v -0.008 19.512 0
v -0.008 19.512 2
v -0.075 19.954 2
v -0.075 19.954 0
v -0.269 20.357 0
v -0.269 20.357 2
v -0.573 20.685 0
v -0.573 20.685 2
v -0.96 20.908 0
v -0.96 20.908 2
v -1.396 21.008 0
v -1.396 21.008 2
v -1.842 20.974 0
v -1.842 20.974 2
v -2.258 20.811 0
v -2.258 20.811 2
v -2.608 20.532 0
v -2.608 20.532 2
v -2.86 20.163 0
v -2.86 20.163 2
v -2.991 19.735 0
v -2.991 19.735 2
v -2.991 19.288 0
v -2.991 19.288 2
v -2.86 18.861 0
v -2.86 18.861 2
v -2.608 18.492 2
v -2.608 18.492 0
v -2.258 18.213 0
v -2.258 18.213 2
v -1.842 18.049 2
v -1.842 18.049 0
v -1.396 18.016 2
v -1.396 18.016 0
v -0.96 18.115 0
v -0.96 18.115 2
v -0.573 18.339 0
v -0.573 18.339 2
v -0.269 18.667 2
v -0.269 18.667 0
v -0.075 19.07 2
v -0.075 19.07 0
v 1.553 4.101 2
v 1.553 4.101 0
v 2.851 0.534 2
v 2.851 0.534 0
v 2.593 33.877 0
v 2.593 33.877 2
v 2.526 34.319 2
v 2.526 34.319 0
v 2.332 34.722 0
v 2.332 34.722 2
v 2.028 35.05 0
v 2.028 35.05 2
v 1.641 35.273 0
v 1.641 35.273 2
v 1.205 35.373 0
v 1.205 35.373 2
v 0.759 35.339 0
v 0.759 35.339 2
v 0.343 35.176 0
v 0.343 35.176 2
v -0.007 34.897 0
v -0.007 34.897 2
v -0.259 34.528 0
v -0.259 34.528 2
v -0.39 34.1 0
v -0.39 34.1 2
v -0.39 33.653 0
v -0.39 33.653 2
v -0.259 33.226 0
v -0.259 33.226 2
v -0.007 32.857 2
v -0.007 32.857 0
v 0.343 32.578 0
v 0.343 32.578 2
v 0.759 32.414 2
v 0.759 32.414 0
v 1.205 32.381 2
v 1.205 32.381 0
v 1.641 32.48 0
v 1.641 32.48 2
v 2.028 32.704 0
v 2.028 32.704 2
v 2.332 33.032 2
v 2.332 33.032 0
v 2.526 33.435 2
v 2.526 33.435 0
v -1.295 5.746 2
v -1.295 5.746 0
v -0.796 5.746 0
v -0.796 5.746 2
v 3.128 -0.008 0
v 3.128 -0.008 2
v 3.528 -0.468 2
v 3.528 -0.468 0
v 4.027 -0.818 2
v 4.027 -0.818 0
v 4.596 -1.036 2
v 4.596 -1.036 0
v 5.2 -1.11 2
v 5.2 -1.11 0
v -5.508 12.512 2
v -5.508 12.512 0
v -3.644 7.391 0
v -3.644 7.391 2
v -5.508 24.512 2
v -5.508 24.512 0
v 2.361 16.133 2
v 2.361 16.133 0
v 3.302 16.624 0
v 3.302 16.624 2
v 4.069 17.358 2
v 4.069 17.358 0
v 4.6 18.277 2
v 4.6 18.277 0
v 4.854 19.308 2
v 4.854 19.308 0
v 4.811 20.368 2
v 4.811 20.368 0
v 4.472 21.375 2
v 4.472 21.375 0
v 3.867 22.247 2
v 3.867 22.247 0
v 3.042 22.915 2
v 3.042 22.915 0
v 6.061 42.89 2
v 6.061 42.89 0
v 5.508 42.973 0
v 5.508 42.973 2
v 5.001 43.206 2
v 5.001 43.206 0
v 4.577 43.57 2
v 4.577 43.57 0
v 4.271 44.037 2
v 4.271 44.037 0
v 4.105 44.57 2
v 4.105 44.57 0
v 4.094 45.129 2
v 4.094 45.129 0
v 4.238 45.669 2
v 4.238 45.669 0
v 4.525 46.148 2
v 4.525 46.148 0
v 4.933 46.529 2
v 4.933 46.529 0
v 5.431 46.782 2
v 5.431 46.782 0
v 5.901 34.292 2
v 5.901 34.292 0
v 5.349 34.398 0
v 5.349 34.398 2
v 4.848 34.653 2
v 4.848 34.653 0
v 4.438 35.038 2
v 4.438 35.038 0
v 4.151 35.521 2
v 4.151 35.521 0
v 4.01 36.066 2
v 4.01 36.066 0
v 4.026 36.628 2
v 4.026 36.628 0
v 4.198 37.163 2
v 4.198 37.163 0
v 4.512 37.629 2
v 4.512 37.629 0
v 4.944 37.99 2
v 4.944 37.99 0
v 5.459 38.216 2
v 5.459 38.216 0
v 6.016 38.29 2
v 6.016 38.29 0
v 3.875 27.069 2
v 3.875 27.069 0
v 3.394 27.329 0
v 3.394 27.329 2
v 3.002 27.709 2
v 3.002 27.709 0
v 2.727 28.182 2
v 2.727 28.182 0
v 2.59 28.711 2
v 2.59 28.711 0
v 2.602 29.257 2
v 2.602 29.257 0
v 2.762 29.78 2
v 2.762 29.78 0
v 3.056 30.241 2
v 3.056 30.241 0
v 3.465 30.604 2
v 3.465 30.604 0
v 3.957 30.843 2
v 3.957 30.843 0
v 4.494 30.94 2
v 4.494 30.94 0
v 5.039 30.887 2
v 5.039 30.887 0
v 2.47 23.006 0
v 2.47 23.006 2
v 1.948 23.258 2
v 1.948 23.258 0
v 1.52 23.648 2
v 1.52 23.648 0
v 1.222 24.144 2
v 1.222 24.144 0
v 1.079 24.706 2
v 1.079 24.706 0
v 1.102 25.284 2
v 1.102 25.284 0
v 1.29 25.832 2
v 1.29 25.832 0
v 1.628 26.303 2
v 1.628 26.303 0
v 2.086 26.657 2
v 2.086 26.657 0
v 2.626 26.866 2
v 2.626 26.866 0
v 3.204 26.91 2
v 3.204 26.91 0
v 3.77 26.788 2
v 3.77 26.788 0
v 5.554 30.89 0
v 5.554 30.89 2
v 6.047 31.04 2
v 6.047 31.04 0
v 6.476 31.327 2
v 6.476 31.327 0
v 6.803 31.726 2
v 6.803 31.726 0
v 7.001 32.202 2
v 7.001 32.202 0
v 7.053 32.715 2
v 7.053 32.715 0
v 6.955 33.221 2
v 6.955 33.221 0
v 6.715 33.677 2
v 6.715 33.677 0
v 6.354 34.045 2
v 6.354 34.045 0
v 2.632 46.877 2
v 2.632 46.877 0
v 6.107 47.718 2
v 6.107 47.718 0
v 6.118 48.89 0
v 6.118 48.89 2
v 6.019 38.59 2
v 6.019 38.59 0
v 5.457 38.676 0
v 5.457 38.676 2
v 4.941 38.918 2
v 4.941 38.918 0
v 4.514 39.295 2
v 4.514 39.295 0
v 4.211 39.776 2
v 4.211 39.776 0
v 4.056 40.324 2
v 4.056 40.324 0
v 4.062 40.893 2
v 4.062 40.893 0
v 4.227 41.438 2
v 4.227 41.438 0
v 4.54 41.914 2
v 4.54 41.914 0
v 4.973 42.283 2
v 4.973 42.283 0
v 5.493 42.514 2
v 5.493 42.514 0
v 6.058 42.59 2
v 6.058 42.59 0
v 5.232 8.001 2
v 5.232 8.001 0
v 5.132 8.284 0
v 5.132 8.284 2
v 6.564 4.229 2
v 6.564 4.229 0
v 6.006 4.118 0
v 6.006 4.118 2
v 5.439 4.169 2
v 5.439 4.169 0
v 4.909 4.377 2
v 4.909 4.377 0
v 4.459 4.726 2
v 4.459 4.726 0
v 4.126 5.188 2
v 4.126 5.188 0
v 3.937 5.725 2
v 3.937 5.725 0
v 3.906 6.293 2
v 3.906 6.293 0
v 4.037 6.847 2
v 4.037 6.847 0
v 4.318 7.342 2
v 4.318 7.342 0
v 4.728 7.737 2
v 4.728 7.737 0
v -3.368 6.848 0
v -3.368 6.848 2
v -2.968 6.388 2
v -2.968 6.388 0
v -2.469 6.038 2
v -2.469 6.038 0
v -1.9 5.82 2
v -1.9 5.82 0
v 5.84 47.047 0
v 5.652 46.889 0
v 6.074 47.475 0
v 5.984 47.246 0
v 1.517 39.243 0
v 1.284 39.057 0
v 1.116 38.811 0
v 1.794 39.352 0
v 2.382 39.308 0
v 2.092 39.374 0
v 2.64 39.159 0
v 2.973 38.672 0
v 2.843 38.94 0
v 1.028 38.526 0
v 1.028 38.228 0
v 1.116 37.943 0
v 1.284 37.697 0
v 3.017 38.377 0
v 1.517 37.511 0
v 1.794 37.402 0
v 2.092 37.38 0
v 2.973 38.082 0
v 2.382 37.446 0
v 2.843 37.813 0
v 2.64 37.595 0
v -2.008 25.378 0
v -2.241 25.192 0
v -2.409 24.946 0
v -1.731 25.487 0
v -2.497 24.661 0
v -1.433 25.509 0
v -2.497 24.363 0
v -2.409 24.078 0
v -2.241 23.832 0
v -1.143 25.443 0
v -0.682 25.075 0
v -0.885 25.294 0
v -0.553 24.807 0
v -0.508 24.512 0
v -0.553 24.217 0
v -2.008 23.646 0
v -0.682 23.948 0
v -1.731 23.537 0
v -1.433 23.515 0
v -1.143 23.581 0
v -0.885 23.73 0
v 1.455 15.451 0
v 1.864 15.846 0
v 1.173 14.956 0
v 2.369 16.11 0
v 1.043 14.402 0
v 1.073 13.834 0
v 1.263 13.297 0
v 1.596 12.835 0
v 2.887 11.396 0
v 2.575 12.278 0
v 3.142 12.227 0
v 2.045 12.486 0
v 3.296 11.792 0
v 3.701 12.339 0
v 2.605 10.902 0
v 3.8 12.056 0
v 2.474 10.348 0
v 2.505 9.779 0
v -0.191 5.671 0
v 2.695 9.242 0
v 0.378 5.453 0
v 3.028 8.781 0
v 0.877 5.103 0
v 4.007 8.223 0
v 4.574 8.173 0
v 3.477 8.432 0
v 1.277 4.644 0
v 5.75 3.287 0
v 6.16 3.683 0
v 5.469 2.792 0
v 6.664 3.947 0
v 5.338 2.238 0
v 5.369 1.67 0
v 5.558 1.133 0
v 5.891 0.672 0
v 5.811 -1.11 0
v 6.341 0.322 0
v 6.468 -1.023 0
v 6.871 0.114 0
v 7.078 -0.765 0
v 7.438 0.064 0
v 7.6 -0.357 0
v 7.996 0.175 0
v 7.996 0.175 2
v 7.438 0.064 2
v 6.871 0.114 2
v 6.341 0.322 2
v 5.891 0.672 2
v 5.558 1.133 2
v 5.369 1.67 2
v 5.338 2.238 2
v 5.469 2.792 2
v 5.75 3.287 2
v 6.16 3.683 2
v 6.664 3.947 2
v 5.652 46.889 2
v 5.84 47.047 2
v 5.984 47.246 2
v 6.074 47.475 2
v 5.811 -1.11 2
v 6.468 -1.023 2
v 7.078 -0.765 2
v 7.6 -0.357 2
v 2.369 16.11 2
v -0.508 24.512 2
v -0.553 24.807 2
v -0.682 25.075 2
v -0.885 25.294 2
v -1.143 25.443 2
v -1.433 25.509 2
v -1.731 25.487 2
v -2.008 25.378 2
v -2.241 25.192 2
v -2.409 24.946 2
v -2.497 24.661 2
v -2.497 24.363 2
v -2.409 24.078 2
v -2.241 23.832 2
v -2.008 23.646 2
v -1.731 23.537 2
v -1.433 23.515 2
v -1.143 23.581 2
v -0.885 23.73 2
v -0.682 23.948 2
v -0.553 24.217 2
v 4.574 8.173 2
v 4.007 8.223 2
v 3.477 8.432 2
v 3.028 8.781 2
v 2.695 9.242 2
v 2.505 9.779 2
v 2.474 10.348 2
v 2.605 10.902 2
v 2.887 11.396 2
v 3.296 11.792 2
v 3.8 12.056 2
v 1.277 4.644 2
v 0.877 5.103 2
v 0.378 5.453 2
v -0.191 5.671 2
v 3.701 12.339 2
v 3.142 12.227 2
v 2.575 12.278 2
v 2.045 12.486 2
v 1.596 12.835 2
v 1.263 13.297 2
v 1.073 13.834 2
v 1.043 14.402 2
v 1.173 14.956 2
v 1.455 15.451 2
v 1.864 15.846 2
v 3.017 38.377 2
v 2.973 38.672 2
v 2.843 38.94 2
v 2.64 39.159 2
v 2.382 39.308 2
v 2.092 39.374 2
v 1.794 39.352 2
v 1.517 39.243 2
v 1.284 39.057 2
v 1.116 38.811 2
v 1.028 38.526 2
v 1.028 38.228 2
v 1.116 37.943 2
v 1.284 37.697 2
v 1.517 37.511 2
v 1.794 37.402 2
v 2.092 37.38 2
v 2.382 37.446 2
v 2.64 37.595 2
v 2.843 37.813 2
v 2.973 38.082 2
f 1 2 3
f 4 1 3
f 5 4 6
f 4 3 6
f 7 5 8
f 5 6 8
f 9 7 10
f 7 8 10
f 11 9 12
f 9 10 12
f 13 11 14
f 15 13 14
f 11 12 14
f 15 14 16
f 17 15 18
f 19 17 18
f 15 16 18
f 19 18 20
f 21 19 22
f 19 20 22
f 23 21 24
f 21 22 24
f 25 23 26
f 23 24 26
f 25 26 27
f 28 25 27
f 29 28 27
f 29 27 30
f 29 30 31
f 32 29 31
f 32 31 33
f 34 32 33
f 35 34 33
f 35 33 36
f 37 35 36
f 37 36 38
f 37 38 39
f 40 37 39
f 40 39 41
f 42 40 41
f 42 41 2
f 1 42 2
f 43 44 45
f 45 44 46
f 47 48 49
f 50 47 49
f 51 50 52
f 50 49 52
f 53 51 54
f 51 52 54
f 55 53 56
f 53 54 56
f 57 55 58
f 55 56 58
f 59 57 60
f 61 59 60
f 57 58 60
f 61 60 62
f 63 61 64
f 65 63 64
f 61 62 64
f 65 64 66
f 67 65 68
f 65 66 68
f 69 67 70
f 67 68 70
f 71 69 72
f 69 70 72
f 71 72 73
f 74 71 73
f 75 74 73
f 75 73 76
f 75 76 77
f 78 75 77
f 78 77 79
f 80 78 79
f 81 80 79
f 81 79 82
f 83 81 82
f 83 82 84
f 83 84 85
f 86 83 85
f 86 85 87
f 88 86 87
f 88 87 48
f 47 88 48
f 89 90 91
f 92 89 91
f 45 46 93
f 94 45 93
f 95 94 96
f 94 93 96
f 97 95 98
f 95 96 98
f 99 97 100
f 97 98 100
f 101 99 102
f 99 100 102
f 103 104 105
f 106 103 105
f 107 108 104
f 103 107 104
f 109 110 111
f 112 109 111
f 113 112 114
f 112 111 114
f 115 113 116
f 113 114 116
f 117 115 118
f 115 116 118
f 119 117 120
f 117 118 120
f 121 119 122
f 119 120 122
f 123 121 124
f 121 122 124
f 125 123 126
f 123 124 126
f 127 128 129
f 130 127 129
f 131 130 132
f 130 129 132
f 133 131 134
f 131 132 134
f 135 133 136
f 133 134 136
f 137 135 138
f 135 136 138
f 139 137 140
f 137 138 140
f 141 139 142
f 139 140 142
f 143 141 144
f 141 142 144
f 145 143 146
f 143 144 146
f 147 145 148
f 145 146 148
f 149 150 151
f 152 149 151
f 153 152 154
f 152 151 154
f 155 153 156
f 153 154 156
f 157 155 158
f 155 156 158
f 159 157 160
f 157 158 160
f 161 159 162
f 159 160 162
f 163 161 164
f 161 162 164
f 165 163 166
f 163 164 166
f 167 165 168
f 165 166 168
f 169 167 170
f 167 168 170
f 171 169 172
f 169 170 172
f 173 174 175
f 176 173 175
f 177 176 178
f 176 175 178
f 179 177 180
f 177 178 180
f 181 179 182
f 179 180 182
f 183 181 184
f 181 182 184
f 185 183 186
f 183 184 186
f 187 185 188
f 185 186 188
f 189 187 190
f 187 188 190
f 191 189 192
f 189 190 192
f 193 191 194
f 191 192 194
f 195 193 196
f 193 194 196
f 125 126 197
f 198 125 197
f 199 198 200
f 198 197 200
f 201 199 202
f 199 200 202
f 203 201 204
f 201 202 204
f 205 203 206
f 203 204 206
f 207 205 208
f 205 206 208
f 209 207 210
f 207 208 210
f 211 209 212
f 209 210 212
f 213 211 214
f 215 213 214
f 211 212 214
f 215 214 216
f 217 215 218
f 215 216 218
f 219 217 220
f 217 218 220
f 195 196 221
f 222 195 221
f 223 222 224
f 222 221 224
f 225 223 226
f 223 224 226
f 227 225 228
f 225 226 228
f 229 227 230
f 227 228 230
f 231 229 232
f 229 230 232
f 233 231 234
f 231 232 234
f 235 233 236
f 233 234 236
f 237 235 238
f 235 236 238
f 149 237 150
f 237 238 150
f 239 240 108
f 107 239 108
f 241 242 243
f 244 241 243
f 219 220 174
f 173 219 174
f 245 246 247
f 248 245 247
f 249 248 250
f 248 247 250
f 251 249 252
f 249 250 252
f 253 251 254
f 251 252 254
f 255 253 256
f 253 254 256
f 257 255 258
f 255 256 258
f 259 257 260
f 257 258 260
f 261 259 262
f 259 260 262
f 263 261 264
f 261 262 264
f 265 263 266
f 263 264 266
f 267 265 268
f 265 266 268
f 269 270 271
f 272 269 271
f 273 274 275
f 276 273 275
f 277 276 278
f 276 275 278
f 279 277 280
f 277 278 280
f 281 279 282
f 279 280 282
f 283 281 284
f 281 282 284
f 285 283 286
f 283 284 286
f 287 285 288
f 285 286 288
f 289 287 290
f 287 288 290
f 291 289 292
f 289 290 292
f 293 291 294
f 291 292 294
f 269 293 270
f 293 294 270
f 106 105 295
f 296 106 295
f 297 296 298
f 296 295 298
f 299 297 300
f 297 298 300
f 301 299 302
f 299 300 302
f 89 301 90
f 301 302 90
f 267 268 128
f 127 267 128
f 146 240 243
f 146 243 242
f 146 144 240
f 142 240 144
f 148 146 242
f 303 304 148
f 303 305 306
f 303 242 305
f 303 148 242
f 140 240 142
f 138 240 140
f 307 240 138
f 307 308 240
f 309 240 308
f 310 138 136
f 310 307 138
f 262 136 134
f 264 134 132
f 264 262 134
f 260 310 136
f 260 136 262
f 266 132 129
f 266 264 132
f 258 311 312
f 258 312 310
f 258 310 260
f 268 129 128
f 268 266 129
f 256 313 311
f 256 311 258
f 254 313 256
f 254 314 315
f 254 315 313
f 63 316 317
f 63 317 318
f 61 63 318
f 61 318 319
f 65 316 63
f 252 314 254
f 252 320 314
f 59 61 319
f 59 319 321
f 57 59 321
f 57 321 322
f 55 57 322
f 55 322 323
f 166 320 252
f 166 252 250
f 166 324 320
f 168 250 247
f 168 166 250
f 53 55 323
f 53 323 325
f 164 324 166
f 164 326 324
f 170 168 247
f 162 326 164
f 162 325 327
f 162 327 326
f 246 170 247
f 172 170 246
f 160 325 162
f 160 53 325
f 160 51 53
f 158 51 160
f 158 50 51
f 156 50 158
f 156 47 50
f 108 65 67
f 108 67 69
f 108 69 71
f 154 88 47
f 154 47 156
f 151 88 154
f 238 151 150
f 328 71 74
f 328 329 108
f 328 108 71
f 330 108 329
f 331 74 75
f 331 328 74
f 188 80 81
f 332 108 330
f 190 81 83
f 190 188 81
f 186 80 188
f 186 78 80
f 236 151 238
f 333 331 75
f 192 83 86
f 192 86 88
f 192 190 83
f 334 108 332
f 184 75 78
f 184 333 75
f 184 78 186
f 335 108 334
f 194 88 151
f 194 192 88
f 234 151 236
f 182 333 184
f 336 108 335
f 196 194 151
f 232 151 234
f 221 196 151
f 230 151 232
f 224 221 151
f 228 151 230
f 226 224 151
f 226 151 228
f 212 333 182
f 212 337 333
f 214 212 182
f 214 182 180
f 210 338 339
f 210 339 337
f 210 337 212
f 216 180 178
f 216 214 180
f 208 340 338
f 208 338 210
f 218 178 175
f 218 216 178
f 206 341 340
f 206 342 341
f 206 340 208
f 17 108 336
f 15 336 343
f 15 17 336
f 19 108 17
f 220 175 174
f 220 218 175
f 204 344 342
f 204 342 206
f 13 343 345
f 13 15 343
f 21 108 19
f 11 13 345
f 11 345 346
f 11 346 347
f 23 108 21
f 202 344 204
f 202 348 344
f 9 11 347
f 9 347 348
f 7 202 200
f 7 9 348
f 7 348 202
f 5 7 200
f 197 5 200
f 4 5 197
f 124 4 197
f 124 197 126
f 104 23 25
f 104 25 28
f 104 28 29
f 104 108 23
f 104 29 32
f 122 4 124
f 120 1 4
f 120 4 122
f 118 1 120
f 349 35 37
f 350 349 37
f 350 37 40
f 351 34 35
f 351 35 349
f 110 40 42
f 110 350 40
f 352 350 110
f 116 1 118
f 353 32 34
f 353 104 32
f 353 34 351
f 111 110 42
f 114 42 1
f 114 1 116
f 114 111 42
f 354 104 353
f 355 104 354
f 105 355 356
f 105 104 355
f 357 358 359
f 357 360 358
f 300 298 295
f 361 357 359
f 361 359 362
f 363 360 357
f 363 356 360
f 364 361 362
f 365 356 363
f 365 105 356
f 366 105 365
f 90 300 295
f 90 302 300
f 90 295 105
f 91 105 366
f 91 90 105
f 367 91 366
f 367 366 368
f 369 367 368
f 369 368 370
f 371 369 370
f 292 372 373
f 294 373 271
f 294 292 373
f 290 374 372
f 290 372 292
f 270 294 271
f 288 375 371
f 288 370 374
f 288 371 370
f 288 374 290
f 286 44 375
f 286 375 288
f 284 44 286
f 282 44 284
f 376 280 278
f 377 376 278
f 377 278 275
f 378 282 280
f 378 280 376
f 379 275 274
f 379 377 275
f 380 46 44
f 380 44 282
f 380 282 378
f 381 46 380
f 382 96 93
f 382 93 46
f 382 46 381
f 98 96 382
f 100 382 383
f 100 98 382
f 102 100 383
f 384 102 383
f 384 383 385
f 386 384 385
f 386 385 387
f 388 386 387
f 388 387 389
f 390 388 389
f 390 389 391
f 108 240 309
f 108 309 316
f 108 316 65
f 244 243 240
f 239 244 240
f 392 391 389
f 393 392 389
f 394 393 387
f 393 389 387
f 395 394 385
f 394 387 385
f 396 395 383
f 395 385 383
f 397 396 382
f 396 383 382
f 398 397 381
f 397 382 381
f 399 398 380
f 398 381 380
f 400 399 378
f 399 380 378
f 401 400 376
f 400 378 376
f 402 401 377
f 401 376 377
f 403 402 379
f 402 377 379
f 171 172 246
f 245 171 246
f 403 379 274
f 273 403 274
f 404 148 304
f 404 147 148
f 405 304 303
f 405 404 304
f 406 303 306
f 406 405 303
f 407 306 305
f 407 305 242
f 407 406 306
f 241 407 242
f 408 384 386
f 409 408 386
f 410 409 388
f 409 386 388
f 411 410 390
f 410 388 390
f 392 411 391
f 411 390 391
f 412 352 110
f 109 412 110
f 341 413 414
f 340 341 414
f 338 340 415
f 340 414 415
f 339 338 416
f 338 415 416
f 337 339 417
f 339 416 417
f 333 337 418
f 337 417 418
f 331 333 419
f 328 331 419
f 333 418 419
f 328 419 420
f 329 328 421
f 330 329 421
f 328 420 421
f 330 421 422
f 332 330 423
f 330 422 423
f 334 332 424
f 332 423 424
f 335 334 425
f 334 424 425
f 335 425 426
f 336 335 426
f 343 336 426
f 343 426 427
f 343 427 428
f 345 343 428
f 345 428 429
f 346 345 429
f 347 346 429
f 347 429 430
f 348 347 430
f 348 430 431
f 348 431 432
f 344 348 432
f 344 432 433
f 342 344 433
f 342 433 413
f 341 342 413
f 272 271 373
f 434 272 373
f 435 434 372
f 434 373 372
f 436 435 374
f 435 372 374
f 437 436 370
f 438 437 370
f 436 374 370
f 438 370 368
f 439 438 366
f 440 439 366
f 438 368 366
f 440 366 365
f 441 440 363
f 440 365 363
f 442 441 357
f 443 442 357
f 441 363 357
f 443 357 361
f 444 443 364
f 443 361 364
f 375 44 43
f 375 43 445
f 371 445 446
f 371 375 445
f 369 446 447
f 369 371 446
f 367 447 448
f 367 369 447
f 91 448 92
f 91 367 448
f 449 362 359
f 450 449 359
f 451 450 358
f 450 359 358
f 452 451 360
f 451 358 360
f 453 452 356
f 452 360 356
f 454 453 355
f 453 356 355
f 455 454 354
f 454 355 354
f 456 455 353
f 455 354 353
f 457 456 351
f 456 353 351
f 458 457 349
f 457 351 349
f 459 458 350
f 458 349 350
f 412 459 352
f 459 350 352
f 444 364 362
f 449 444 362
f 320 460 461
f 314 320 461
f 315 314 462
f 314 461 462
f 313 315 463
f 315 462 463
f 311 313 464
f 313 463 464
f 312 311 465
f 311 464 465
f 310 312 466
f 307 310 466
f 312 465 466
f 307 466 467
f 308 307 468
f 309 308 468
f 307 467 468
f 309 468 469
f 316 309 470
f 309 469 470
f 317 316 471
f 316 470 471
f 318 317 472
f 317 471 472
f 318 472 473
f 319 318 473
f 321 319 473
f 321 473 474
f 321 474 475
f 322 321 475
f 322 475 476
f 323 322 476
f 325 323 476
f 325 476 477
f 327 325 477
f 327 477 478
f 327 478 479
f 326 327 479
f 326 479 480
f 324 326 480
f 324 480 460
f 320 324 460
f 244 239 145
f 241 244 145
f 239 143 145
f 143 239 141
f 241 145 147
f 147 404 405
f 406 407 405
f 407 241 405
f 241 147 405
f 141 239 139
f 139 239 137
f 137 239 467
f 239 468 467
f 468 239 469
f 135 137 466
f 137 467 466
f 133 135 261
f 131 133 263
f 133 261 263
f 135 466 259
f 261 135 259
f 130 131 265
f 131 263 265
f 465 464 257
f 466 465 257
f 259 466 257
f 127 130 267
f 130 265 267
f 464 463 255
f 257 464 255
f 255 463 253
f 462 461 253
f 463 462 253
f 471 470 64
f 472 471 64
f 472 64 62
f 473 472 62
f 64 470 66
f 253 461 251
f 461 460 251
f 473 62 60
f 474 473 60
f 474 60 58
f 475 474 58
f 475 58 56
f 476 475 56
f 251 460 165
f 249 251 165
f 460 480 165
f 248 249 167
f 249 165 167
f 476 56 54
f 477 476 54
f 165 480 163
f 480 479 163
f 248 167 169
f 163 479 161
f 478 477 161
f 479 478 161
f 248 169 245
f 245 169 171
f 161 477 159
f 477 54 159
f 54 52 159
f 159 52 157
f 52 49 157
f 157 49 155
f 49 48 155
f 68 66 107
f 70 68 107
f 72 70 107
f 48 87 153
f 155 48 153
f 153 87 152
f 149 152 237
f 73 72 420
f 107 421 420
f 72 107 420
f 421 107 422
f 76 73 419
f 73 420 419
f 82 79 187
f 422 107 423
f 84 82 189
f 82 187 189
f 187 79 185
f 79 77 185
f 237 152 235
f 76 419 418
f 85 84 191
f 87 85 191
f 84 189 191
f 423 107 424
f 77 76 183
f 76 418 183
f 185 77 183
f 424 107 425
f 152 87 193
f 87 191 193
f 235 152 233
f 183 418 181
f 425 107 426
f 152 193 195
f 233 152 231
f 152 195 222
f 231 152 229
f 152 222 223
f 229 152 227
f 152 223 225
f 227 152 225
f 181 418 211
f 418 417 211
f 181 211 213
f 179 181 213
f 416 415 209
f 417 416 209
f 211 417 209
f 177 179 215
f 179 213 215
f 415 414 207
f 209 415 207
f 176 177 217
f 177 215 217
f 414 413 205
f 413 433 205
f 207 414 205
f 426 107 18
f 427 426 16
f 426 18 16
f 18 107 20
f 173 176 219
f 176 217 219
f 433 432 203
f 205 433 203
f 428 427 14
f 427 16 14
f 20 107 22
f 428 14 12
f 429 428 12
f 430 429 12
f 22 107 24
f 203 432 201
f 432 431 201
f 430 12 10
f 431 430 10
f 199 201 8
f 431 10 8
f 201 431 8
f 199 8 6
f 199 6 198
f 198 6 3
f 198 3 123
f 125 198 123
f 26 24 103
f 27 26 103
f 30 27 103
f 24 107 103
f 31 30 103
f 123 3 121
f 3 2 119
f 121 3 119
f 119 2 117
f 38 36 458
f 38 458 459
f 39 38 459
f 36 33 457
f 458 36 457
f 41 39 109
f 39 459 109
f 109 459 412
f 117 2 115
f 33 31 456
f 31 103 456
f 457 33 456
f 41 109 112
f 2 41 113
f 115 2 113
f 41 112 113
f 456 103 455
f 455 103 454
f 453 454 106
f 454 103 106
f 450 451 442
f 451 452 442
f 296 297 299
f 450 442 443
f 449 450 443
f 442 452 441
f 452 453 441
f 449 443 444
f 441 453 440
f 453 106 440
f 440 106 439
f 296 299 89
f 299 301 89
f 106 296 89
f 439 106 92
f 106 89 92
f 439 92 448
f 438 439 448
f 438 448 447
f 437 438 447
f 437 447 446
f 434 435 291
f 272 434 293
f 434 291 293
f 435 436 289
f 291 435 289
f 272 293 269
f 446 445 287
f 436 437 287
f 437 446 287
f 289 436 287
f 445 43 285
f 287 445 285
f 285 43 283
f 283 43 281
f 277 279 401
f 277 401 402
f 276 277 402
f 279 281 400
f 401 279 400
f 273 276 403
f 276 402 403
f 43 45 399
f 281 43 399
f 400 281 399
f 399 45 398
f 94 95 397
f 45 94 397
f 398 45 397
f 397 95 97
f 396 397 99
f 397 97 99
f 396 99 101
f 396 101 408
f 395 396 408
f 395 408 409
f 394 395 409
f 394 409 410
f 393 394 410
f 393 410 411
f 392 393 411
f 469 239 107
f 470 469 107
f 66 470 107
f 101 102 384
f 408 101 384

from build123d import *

# Parameters (mm, degrees)
BOSS_EXTRU_2_DEPTH      = 2
CONG_1_R                = 1
ESQUISSE2_R             = 1
ESQUISSE2_R_2           = 1.5
ENL_V_MAT_EXTRU_1_DEPTH = 50.654670275
CONG_2_R                = 2.5


with BuildPart() as part:
    # Esquisse1 → Boss.-Extru.2 (new body)
    with BuildSketch(Plane.XY):
        with BuildLine():
            Line((0.95447274, 5.745584386), (3.449873287, -1.110472271))
            Line((3.449873287, -1.110472271), (8.449873287, -1.110472271))
            Line((8.449873287, -1.110472271), (7.995996013, 0.174830759))
            ThreePointArc((7.995996013, 0.174830759), (5.44417176, 1.394745914), (6.664086914, 3.946570166))
            Line((6.664086914, 3.946570166), (6.564193732, 4.229450622))
            ThreePointArc((6.564193732, 4.229450622), (4.012369479, 5.449365776), (5.232284634, 8.001190029))
            Line((5.232284634, 8.001190029), (5.132391451, 8.284070484))
            ThreePointArc((5.132391451, 8.284070484), (2.580567198, 9.503985638), (3.800482353, 12.055809891))
            Line((3.800482353, 12.055809891), (3.70058917, 12.338690347))
            ThreePointArc((3.70058917, 12.338690347), (1.148764918, 13.558605501), (2.368680072, 16.110429753))
            Line((2.368680072, 16.110429753), (2.360851147, 16.132599934))
            ThreePointArc((2.360851147, 16.132599934), (4.854316205, 19.307619995), (3.042318195, 22.915220804))
            ThreePointArc((3.042318195, 22.915220804), (1.102078927, 25.284293174), (3.769763015, 26.787787077))
            Line((3.769763015, 26.787787077), (3.87507245, 27.068696178))
            ThreePointArc((3.87507245, 27.068696178), (2.663964414, 29.524327439), (5.038572788, 30.887464495))
            ThreePointArc((5.038572788, 30.887464495), (7.001105436, 32.201717881), (5.901338085, 34.292006887))
            ThreePointArc((5.901338085, 34.292006887), (3.997941168, 36.347217372), (6.01632714, 38.289620015))
            Line((6.01632714, 38.289620015), (6.019210973, 38.589804586))
            ThreePointArc((6.019210973, 38.589804586), (4.038516109, 40.608925151), (6.057636674, 42.589620015))
            Line((6.057636674, 42.589620015), (6.060520508, 42.889804586))
            ThreePointArc((6.060520508, 42.889804586), (4.079825644, 44.908925151), (6.098946209, 46.889620015))
            Line((6.098946209, 46.889620015), (6.11815906, 48.889527729))
            Line((6.11815906, 48.889527729), (2.631980822, 46.876781785))
            Line((2.631980822, 46.876781785), (-5.50821759, 24.511770458))
            Line((-5.50821759, 24.511770458), (-5.50821759, 12.511770458))
            Line((-5.50821759, 12.511770458), (-3.04552726, 5.745584386))
            Line((-3.04552726, 5.745584386), (0.95447274, 5.745584386))
        make_face()
    extrude(amount=BOSS_EXTRU_2_DEPTH)

    # Congé1
    cong_1_edges = [part.edges().sort_by_distance(p)[0] for p in [
        (6.098946209, 46.889620015, 1),
    ]]
    fillet(cong_1_edges, radius=CONG_1_R)

    # Esquisse2 → Enlèv. mat.-Extru.1 (cut, through all)
    with BuildSketch(Plane.XY.offset(2)):
        with Locations((2.016979912, 38.376781785)):
            Circle(ESQUISSE2_R)
        with Locations((1.092901094, 33.876781785)):
            Circle(ESQUISSE2_R_2)
        with Locations((-1.50821759, 19.511770458)):
            Circle(ESQUISSE2_R_2)
        with Locations((-1.50821759, 24.511770458)):
            Circle(ESQUISSE2_R)
    extrude(amount=-ENL_V_MAT_EXTRU_1_DEPTH, mode=Mode.SUBTRACT)

    # Congé2
    # the kernel refuses this fillet: 2.5 mm, written as the material it adds along each edge
    with BuildSketch(Plane(origin=(0.95447274, 5.745584386, 0), x_dir=(-1, 0, 0), z_dir=(0, 0, 1))) as cong_2_piece_1:
        with BuildLine():
            CenterArc((CONG_2_R * 0.70020753821, CONG_2_R), CONG_2_R, 200, 70)
            Line((-CONG_2_R * 0.239485082576, CONG_2_R * 0.657979856674), (0, 0))
            Line((0, 0), (CONG_2_R * 0.70020753821, 0))
        make_face()
    extrude(amount=2)
    # the kernel refuses this fillet: 2.5 mm, written as the material it takes off along each edge
    with BuildSketch(Plane(origin=(8.449873287, -1.110472271, -6.597356953), x_dir=(-1, 0, 0), z_dir=(0, 0, 1))) as cong_2_2_piece_1:
        with BuildLine():
            CenterArc((2.638942781, -2.5), CONG_2_R, 90, 60.929935742)
            Line((0.453877274, -1.28530303), (0, 0))
            Line((0, 0), (2.638942781, 0))
        make_face()
    extrude(amount=15.194713907, mode=Mode.SUBTRACT)
    with BuildSketch(Plane(origin=(3.449873287, -1.110472271, -4.376297114), x_dir=(-0.3420201433256723, 0.9396926207859071, 0), z_dir=(0, 0, 1)), Plane(origin=(-3.04552726, 5.745584386, -4.376297114), x_dir=(-0.34202014332566605, 0.9396926207859094, 0), z_dir=(0, 0, 1))) as cong_2_2_piece_2:
        with BuildLine():
            CenterArc((CONG_2_R * 0.70020753821, -CONG_2_R), CONG_2_R, 90, 70)
            Line((-CONG_2_R * 0.239485082576, -CONG_2_R * 0.657979856674), (0, 0))
            Line((0, 0), (CONG_2_R * 0.70020753821, 0))
        make_face()
    extrude(amount=10.752594228, mode=Mode.SUBTRACT)


solid = part.part
